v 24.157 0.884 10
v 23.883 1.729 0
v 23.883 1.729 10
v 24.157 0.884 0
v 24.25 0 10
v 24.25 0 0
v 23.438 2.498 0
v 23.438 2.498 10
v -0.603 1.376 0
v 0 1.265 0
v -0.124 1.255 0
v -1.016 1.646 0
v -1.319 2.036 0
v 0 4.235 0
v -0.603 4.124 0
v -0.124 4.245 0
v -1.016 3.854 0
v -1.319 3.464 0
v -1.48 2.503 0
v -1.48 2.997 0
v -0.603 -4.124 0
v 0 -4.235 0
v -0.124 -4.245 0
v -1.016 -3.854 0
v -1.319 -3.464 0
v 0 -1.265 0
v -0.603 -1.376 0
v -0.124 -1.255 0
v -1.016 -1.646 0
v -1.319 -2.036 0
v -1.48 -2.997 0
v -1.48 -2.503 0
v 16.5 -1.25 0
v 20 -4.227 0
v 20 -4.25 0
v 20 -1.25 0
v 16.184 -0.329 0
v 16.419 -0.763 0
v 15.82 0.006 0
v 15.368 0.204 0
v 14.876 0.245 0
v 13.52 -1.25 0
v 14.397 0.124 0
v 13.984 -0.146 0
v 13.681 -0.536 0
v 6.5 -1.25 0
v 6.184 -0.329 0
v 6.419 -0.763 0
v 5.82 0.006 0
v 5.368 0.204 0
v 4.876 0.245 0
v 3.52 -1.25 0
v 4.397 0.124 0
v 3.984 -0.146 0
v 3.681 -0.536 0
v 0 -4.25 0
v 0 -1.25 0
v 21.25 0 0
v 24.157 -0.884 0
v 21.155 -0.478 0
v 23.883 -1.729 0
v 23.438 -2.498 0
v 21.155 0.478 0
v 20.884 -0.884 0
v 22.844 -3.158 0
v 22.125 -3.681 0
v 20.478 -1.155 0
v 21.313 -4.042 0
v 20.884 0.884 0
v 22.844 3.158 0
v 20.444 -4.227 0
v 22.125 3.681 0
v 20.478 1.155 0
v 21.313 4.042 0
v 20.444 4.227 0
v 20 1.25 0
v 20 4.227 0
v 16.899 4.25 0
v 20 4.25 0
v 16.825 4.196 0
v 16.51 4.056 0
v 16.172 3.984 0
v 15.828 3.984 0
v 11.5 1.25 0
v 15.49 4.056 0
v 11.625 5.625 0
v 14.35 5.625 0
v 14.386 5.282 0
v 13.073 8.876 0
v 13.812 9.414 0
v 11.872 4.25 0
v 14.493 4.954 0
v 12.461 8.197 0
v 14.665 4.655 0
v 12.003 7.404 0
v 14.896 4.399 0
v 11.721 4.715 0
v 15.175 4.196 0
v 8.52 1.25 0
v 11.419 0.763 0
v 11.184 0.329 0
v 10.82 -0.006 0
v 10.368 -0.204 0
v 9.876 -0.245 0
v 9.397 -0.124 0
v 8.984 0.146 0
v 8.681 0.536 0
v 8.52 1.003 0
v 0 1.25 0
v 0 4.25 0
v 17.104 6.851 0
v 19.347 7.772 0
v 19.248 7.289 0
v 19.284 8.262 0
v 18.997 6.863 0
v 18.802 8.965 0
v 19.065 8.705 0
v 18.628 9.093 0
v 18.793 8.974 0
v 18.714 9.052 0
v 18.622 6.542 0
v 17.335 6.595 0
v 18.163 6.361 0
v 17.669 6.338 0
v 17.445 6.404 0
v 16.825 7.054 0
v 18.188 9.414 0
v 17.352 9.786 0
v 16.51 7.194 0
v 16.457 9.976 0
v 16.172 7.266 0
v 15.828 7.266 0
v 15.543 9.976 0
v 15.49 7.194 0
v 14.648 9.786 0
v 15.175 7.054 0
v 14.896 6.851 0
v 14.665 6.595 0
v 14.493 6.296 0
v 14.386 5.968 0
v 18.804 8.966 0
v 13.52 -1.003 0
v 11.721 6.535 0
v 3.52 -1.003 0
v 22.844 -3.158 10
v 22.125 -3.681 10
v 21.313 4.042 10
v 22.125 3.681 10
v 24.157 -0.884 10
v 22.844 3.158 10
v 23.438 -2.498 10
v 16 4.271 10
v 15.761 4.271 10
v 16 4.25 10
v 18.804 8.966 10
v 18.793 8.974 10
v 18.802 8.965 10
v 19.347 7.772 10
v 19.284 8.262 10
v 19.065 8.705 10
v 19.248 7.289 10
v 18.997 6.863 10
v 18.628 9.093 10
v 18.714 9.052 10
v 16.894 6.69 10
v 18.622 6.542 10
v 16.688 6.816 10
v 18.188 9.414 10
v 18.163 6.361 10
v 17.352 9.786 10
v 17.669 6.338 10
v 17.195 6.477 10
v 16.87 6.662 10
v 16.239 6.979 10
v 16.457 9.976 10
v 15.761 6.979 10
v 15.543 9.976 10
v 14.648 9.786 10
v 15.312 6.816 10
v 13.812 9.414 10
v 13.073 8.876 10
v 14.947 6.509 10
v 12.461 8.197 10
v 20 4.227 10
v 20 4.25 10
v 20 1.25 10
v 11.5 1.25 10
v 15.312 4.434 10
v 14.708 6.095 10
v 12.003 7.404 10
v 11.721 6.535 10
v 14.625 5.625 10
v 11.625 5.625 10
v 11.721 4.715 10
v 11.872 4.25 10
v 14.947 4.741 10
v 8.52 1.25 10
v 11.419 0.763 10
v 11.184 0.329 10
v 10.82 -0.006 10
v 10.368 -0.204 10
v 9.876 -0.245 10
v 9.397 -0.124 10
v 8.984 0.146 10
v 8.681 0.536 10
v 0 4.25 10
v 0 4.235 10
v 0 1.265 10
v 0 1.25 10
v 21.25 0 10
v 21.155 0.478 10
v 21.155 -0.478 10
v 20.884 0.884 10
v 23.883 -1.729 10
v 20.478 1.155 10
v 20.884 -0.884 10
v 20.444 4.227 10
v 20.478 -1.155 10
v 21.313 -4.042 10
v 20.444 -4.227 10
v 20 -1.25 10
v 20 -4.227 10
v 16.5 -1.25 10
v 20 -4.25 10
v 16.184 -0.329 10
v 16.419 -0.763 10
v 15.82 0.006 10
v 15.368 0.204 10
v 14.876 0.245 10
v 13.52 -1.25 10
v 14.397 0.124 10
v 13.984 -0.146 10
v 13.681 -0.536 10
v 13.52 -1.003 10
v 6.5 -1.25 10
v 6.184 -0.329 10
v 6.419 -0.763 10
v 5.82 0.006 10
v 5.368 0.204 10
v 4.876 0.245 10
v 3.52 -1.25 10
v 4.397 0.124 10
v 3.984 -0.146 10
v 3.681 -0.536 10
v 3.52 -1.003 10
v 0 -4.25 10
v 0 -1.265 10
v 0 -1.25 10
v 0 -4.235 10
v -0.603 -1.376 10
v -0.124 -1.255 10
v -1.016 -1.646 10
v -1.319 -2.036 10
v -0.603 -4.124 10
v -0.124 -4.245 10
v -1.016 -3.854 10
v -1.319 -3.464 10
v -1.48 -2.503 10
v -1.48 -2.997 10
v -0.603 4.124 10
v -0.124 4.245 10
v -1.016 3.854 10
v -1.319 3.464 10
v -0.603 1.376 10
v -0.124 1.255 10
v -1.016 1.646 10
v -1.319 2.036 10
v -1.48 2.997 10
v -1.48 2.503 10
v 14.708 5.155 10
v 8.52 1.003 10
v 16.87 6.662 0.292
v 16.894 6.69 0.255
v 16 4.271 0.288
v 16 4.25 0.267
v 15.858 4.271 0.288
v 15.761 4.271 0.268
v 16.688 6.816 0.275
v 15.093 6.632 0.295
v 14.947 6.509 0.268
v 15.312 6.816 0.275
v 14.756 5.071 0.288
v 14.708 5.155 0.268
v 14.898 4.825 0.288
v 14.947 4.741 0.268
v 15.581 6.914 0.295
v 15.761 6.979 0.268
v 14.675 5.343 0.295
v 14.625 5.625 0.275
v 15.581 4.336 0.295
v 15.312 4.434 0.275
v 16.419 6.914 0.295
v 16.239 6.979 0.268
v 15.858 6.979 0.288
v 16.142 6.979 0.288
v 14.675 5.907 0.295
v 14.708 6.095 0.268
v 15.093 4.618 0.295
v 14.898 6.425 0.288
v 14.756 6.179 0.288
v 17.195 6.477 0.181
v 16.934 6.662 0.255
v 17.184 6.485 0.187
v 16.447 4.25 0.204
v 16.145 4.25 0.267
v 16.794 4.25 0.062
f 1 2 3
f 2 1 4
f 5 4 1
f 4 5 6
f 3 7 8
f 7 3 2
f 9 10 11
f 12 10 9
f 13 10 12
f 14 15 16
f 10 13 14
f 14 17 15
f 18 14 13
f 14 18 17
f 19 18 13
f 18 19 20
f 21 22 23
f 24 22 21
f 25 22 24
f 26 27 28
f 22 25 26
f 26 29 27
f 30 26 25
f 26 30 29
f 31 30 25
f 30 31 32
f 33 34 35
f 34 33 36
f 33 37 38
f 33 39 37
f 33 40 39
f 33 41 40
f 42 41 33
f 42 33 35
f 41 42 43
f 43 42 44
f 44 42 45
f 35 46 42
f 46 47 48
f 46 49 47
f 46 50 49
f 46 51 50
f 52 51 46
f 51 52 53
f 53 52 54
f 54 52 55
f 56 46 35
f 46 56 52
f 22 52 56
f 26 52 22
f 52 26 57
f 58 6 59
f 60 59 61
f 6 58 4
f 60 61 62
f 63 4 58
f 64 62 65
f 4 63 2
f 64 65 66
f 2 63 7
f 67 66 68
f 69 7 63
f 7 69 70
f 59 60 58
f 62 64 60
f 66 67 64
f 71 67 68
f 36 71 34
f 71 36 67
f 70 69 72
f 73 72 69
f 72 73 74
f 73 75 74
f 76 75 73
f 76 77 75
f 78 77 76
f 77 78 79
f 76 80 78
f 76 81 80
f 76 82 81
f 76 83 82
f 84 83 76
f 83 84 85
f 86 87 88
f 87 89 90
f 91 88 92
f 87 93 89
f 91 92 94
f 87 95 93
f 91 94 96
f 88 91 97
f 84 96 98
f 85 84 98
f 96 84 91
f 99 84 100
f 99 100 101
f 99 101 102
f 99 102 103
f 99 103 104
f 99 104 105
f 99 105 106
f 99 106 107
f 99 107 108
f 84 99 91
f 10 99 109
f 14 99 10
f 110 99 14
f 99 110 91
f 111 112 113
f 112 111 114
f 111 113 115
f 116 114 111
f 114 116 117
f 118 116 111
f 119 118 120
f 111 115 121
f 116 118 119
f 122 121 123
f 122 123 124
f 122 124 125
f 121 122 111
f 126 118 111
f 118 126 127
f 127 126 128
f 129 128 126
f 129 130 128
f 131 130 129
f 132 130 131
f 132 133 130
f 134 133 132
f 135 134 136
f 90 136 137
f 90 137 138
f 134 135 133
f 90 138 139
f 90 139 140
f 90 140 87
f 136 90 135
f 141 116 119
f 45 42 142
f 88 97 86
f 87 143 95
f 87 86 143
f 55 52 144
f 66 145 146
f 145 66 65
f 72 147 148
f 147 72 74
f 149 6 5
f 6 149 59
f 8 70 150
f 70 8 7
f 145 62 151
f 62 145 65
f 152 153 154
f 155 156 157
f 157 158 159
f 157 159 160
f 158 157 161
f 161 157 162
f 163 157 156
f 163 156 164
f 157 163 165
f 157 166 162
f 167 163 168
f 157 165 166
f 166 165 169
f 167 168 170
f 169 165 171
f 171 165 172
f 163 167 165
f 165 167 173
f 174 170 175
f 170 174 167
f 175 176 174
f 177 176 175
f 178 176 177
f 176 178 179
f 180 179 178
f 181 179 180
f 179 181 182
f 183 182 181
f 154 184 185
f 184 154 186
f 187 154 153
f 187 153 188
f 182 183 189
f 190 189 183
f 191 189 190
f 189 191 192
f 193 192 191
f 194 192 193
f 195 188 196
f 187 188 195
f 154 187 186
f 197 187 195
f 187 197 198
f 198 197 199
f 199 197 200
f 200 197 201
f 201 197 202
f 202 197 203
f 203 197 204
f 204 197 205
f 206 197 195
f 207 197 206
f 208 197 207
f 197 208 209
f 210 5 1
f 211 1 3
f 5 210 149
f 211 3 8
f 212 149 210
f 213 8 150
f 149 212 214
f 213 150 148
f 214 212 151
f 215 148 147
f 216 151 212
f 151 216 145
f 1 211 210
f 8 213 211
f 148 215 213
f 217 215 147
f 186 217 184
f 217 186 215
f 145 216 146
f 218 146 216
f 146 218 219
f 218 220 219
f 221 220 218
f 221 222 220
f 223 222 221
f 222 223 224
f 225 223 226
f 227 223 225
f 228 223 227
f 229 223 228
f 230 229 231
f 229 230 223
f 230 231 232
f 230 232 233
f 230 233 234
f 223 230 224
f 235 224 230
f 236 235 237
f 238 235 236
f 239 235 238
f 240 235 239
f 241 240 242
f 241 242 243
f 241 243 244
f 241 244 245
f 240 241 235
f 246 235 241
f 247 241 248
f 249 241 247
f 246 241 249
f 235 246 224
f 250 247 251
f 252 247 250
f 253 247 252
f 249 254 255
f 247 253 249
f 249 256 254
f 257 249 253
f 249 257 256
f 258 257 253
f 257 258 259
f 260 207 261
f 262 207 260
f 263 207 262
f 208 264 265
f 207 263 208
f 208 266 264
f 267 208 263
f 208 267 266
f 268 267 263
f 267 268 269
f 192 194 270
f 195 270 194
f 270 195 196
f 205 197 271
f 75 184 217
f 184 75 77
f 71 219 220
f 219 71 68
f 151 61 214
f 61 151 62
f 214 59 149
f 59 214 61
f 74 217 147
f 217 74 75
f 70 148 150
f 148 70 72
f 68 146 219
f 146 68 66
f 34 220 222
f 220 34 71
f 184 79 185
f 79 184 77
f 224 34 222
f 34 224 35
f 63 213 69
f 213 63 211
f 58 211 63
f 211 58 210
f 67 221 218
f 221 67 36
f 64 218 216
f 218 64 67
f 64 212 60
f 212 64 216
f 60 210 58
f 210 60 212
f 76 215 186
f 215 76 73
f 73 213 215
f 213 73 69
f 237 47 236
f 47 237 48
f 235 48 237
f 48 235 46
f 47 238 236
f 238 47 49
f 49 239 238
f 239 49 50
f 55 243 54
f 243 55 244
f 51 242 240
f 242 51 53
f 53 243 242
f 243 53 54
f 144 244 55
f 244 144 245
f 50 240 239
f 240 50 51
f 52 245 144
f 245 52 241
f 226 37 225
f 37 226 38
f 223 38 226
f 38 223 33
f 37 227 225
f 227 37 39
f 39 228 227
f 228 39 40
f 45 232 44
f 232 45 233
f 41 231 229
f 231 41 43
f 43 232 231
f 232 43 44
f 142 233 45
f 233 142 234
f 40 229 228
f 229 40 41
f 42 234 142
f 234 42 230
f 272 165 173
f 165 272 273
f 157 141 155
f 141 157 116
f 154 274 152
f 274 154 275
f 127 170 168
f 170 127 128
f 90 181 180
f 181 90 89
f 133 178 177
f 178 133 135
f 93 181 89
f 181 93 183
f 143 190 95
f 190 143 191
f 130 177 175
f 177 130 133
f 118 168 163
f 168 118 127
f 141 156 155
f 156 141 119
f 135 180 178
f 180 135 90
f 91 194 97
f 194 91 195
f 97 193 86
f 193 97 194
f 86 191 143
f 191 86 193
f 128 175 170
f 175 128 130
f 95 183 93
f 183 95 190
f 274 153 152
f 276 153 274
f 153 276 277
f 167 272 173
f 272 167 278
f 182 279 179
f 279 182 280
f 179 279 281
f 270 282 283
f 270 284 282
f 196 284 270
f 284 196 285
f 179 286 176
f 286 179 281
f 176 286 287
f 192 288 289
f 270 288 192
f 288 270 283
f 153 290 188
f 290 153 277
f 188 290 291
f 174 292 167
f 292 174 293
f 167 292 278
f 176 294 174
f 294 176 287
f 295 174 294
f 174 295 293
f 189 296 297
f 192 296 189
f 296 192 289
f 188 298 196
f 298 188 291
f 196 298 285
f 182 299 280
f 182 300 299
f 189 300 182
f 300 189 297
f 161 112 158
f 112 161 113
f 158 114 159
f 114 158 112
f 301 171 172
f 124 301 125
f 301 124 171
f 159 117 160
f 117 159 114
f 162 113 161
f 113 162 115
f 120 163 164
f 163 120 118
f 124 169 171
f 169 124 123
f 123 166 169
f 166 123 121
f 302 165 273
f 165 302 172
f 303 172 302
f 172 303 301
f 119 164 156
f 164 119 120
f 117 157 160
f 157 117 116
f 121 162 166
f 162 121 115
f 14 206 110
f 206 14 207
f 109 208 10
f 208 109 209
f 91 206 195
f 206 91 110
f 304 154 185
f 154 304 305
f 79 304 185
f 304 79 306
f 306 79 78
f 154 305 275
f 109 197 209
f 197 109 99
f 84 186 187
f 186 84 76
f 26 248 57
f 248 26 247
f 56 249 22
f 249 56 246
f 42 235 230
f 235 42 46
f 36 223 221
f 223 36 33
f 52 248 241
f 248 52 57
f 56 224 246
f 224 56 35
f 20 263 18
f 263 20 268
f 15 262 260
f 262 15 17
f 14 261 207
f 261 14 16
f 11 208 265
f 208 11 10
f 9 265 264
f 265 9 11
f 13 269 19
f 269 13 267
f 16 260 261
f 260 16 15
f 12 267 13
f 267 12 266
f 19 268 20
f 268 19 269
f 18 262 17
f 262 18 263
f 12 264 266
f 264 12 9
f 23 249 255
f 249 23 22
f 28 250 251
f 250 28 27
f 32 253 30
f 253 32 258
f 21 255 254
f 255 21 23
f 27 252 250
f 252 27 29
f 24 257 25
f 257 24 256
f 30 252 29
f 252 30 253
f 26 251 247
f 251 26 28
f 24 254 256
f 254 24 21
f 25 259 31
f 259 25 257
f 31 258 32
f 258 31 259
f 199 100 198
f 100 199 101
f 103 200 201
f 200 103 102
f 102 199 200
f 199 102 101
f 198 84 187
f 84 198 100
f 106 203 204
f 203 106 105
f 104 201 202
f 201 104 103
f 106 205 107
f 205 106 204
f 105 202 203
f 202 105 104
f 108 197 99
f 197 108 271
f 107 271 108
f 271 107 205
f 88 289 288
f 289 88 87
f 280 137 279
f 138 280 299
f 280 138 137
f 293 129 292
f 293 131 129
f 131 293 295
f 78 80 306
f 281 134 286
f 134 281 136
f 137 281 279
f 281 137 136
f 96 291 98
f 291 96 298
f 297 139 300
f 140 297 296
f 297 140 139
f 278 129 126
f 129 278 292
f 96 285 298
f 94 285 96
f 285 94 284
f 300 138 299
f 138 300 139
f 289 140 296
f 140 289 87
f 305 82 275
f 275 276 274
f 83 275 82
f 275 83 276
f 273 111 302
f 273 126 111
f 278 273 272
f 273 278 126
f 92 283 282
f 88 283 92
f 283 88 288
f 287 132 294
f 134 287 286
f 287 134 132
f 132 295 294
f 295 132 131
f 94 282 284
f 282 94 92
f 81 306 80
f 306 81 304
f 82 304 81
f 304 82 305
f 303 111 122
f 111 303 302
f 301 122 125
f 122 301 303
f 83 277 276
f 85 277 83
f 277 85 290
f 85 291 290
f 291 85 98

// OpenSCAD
// Diameter of the cord to be wrangled, set to zero to remove the cord wrangler entirely (mm)
CordDiameter=2.75;
// Adjust the cut angle of the cord gripping portion, 30 degrees seems to be good but go nuts if you like
CordGripAngle=40; //[0:90]
// How far along on the gripper should the cord wrangler be placed?
CordGripLoc=80; //[0:100]
// Maybe you're using this as something other than just a cord gripper (as I sometimes do)
CordGripStyle=1; //[0:Closed,1:Open]

//How long should the fabric (or other substance) gripper be? (mm)
GripperLength=20;
//And how tall? (mm)
GripperHeight=10;
//And how far apart (mm)
GripperGap=2.5;

//Interior gripping knobbles, how many?
Knobbles = 2;
//Opposing knobbles on the top?
CounterKnobbles=true;//[true:Yes,false:No]

//And how thick would you like the walls of the gripper to be? (mm)
WallThickness=3;

/* [Hidden] */
CordGripLocation=CordGripLoc/100.0;
$fs=.5;

difference(){
 union(){
  translate([GripperLength,0,0])
   difference(){
    cylinder(r=GripperGap/2+WallThickness, h=GripperHeight);
    translate([-GripperGap-2*WallThickness,-GripperGap/2-WallThickness*1.5,-0.5]) cube([GripperGap+2*WallThickness,GripperGap+3*WallThickness, GripperHeight+1]);
    translate([0,0,-0.5]) cylinder(r=GripperGap/2, h=GripperHeight+1);
   }

  translate([0,GripperGap/2,0]) cube([GripperLength,WallThickness,GripperHeight]);
  translate([0,-GripperGap/2-WallThickness,0]) cube([GripperLength,WallThickness,GripperHeight]);

  translate([0,GripperGap/2+WallThickness/2,0]) cylinder(r=WallThickness/2, h=GripperHeight);
  translate([0,-GripperGap/2-WallThickness/2,0]) cylinder(r=WallThickness/2, h=GripperHeight);

  for ( i = [0:Knobbles-1] ){
   translate([(i+0.5)*GripperLength/Knobbles,-GripperGap/2,0]) cylinder(r=WallThickness/2, h=GripperHeight);
  }
  if (CounterKnobbles) 
   for ( i = [1:Knobbles-1] ){
    translate([(i)*GripperLength/Knobbles,GripperGap/2,0]) cylinder(r=WallThickness/2, h=GripperHeight);
   }

  if (CordDiameter > 0) {
   translate([GripperLength*CordGripLocation,GripperGap/2+(WallThickness+CordDiameter)/2+WallThickness/2,0]) {
   difference(){
    cylinder(r=CordDiameter/2+WallThickness, h=GripperHeight);
    translate([0,0,-0.5]) cylinder(r=CordDiameter/2, h=GripperHeight+1);
    if (CordGripStyle == 1){
     rotate([0,0,-1*abs(CordGripAngle)]) translate([0,0,-0.5]) cube([CordDiameter*2,CordDiameter*2,GripperHeight+1]);
     rotate([0,0,-90]) translate([0,0,-0.5]) cube([CordDiameter*2,CordDiameter*2,GripperHeight+1]);
    }
   }
   if (CordGripStyle == 1) rotate([0,0,-1*abs(CordGripAngle)]) translate([0,(WallThickness+CordDiameter)/2,0]) cylinder(r=WallThickness/2, h=GripperHeight);
  }
 }
}
//Put a bevel on the bottom edge of the cord grip because I don't like the "bottom layer squish" cutting into my cables.
if (CordDiameter > 0){
  translate([GripperLength*CordGripLocation,GripperGap/2+(WallThickness+CordDiameter)/2+WallThickness/2,0]) {
  translate([0,0,-CordDiameter*0.4]) cylinder(r1=CordDiameter,r2=0,h=CordDiameter);
 }
}
}
